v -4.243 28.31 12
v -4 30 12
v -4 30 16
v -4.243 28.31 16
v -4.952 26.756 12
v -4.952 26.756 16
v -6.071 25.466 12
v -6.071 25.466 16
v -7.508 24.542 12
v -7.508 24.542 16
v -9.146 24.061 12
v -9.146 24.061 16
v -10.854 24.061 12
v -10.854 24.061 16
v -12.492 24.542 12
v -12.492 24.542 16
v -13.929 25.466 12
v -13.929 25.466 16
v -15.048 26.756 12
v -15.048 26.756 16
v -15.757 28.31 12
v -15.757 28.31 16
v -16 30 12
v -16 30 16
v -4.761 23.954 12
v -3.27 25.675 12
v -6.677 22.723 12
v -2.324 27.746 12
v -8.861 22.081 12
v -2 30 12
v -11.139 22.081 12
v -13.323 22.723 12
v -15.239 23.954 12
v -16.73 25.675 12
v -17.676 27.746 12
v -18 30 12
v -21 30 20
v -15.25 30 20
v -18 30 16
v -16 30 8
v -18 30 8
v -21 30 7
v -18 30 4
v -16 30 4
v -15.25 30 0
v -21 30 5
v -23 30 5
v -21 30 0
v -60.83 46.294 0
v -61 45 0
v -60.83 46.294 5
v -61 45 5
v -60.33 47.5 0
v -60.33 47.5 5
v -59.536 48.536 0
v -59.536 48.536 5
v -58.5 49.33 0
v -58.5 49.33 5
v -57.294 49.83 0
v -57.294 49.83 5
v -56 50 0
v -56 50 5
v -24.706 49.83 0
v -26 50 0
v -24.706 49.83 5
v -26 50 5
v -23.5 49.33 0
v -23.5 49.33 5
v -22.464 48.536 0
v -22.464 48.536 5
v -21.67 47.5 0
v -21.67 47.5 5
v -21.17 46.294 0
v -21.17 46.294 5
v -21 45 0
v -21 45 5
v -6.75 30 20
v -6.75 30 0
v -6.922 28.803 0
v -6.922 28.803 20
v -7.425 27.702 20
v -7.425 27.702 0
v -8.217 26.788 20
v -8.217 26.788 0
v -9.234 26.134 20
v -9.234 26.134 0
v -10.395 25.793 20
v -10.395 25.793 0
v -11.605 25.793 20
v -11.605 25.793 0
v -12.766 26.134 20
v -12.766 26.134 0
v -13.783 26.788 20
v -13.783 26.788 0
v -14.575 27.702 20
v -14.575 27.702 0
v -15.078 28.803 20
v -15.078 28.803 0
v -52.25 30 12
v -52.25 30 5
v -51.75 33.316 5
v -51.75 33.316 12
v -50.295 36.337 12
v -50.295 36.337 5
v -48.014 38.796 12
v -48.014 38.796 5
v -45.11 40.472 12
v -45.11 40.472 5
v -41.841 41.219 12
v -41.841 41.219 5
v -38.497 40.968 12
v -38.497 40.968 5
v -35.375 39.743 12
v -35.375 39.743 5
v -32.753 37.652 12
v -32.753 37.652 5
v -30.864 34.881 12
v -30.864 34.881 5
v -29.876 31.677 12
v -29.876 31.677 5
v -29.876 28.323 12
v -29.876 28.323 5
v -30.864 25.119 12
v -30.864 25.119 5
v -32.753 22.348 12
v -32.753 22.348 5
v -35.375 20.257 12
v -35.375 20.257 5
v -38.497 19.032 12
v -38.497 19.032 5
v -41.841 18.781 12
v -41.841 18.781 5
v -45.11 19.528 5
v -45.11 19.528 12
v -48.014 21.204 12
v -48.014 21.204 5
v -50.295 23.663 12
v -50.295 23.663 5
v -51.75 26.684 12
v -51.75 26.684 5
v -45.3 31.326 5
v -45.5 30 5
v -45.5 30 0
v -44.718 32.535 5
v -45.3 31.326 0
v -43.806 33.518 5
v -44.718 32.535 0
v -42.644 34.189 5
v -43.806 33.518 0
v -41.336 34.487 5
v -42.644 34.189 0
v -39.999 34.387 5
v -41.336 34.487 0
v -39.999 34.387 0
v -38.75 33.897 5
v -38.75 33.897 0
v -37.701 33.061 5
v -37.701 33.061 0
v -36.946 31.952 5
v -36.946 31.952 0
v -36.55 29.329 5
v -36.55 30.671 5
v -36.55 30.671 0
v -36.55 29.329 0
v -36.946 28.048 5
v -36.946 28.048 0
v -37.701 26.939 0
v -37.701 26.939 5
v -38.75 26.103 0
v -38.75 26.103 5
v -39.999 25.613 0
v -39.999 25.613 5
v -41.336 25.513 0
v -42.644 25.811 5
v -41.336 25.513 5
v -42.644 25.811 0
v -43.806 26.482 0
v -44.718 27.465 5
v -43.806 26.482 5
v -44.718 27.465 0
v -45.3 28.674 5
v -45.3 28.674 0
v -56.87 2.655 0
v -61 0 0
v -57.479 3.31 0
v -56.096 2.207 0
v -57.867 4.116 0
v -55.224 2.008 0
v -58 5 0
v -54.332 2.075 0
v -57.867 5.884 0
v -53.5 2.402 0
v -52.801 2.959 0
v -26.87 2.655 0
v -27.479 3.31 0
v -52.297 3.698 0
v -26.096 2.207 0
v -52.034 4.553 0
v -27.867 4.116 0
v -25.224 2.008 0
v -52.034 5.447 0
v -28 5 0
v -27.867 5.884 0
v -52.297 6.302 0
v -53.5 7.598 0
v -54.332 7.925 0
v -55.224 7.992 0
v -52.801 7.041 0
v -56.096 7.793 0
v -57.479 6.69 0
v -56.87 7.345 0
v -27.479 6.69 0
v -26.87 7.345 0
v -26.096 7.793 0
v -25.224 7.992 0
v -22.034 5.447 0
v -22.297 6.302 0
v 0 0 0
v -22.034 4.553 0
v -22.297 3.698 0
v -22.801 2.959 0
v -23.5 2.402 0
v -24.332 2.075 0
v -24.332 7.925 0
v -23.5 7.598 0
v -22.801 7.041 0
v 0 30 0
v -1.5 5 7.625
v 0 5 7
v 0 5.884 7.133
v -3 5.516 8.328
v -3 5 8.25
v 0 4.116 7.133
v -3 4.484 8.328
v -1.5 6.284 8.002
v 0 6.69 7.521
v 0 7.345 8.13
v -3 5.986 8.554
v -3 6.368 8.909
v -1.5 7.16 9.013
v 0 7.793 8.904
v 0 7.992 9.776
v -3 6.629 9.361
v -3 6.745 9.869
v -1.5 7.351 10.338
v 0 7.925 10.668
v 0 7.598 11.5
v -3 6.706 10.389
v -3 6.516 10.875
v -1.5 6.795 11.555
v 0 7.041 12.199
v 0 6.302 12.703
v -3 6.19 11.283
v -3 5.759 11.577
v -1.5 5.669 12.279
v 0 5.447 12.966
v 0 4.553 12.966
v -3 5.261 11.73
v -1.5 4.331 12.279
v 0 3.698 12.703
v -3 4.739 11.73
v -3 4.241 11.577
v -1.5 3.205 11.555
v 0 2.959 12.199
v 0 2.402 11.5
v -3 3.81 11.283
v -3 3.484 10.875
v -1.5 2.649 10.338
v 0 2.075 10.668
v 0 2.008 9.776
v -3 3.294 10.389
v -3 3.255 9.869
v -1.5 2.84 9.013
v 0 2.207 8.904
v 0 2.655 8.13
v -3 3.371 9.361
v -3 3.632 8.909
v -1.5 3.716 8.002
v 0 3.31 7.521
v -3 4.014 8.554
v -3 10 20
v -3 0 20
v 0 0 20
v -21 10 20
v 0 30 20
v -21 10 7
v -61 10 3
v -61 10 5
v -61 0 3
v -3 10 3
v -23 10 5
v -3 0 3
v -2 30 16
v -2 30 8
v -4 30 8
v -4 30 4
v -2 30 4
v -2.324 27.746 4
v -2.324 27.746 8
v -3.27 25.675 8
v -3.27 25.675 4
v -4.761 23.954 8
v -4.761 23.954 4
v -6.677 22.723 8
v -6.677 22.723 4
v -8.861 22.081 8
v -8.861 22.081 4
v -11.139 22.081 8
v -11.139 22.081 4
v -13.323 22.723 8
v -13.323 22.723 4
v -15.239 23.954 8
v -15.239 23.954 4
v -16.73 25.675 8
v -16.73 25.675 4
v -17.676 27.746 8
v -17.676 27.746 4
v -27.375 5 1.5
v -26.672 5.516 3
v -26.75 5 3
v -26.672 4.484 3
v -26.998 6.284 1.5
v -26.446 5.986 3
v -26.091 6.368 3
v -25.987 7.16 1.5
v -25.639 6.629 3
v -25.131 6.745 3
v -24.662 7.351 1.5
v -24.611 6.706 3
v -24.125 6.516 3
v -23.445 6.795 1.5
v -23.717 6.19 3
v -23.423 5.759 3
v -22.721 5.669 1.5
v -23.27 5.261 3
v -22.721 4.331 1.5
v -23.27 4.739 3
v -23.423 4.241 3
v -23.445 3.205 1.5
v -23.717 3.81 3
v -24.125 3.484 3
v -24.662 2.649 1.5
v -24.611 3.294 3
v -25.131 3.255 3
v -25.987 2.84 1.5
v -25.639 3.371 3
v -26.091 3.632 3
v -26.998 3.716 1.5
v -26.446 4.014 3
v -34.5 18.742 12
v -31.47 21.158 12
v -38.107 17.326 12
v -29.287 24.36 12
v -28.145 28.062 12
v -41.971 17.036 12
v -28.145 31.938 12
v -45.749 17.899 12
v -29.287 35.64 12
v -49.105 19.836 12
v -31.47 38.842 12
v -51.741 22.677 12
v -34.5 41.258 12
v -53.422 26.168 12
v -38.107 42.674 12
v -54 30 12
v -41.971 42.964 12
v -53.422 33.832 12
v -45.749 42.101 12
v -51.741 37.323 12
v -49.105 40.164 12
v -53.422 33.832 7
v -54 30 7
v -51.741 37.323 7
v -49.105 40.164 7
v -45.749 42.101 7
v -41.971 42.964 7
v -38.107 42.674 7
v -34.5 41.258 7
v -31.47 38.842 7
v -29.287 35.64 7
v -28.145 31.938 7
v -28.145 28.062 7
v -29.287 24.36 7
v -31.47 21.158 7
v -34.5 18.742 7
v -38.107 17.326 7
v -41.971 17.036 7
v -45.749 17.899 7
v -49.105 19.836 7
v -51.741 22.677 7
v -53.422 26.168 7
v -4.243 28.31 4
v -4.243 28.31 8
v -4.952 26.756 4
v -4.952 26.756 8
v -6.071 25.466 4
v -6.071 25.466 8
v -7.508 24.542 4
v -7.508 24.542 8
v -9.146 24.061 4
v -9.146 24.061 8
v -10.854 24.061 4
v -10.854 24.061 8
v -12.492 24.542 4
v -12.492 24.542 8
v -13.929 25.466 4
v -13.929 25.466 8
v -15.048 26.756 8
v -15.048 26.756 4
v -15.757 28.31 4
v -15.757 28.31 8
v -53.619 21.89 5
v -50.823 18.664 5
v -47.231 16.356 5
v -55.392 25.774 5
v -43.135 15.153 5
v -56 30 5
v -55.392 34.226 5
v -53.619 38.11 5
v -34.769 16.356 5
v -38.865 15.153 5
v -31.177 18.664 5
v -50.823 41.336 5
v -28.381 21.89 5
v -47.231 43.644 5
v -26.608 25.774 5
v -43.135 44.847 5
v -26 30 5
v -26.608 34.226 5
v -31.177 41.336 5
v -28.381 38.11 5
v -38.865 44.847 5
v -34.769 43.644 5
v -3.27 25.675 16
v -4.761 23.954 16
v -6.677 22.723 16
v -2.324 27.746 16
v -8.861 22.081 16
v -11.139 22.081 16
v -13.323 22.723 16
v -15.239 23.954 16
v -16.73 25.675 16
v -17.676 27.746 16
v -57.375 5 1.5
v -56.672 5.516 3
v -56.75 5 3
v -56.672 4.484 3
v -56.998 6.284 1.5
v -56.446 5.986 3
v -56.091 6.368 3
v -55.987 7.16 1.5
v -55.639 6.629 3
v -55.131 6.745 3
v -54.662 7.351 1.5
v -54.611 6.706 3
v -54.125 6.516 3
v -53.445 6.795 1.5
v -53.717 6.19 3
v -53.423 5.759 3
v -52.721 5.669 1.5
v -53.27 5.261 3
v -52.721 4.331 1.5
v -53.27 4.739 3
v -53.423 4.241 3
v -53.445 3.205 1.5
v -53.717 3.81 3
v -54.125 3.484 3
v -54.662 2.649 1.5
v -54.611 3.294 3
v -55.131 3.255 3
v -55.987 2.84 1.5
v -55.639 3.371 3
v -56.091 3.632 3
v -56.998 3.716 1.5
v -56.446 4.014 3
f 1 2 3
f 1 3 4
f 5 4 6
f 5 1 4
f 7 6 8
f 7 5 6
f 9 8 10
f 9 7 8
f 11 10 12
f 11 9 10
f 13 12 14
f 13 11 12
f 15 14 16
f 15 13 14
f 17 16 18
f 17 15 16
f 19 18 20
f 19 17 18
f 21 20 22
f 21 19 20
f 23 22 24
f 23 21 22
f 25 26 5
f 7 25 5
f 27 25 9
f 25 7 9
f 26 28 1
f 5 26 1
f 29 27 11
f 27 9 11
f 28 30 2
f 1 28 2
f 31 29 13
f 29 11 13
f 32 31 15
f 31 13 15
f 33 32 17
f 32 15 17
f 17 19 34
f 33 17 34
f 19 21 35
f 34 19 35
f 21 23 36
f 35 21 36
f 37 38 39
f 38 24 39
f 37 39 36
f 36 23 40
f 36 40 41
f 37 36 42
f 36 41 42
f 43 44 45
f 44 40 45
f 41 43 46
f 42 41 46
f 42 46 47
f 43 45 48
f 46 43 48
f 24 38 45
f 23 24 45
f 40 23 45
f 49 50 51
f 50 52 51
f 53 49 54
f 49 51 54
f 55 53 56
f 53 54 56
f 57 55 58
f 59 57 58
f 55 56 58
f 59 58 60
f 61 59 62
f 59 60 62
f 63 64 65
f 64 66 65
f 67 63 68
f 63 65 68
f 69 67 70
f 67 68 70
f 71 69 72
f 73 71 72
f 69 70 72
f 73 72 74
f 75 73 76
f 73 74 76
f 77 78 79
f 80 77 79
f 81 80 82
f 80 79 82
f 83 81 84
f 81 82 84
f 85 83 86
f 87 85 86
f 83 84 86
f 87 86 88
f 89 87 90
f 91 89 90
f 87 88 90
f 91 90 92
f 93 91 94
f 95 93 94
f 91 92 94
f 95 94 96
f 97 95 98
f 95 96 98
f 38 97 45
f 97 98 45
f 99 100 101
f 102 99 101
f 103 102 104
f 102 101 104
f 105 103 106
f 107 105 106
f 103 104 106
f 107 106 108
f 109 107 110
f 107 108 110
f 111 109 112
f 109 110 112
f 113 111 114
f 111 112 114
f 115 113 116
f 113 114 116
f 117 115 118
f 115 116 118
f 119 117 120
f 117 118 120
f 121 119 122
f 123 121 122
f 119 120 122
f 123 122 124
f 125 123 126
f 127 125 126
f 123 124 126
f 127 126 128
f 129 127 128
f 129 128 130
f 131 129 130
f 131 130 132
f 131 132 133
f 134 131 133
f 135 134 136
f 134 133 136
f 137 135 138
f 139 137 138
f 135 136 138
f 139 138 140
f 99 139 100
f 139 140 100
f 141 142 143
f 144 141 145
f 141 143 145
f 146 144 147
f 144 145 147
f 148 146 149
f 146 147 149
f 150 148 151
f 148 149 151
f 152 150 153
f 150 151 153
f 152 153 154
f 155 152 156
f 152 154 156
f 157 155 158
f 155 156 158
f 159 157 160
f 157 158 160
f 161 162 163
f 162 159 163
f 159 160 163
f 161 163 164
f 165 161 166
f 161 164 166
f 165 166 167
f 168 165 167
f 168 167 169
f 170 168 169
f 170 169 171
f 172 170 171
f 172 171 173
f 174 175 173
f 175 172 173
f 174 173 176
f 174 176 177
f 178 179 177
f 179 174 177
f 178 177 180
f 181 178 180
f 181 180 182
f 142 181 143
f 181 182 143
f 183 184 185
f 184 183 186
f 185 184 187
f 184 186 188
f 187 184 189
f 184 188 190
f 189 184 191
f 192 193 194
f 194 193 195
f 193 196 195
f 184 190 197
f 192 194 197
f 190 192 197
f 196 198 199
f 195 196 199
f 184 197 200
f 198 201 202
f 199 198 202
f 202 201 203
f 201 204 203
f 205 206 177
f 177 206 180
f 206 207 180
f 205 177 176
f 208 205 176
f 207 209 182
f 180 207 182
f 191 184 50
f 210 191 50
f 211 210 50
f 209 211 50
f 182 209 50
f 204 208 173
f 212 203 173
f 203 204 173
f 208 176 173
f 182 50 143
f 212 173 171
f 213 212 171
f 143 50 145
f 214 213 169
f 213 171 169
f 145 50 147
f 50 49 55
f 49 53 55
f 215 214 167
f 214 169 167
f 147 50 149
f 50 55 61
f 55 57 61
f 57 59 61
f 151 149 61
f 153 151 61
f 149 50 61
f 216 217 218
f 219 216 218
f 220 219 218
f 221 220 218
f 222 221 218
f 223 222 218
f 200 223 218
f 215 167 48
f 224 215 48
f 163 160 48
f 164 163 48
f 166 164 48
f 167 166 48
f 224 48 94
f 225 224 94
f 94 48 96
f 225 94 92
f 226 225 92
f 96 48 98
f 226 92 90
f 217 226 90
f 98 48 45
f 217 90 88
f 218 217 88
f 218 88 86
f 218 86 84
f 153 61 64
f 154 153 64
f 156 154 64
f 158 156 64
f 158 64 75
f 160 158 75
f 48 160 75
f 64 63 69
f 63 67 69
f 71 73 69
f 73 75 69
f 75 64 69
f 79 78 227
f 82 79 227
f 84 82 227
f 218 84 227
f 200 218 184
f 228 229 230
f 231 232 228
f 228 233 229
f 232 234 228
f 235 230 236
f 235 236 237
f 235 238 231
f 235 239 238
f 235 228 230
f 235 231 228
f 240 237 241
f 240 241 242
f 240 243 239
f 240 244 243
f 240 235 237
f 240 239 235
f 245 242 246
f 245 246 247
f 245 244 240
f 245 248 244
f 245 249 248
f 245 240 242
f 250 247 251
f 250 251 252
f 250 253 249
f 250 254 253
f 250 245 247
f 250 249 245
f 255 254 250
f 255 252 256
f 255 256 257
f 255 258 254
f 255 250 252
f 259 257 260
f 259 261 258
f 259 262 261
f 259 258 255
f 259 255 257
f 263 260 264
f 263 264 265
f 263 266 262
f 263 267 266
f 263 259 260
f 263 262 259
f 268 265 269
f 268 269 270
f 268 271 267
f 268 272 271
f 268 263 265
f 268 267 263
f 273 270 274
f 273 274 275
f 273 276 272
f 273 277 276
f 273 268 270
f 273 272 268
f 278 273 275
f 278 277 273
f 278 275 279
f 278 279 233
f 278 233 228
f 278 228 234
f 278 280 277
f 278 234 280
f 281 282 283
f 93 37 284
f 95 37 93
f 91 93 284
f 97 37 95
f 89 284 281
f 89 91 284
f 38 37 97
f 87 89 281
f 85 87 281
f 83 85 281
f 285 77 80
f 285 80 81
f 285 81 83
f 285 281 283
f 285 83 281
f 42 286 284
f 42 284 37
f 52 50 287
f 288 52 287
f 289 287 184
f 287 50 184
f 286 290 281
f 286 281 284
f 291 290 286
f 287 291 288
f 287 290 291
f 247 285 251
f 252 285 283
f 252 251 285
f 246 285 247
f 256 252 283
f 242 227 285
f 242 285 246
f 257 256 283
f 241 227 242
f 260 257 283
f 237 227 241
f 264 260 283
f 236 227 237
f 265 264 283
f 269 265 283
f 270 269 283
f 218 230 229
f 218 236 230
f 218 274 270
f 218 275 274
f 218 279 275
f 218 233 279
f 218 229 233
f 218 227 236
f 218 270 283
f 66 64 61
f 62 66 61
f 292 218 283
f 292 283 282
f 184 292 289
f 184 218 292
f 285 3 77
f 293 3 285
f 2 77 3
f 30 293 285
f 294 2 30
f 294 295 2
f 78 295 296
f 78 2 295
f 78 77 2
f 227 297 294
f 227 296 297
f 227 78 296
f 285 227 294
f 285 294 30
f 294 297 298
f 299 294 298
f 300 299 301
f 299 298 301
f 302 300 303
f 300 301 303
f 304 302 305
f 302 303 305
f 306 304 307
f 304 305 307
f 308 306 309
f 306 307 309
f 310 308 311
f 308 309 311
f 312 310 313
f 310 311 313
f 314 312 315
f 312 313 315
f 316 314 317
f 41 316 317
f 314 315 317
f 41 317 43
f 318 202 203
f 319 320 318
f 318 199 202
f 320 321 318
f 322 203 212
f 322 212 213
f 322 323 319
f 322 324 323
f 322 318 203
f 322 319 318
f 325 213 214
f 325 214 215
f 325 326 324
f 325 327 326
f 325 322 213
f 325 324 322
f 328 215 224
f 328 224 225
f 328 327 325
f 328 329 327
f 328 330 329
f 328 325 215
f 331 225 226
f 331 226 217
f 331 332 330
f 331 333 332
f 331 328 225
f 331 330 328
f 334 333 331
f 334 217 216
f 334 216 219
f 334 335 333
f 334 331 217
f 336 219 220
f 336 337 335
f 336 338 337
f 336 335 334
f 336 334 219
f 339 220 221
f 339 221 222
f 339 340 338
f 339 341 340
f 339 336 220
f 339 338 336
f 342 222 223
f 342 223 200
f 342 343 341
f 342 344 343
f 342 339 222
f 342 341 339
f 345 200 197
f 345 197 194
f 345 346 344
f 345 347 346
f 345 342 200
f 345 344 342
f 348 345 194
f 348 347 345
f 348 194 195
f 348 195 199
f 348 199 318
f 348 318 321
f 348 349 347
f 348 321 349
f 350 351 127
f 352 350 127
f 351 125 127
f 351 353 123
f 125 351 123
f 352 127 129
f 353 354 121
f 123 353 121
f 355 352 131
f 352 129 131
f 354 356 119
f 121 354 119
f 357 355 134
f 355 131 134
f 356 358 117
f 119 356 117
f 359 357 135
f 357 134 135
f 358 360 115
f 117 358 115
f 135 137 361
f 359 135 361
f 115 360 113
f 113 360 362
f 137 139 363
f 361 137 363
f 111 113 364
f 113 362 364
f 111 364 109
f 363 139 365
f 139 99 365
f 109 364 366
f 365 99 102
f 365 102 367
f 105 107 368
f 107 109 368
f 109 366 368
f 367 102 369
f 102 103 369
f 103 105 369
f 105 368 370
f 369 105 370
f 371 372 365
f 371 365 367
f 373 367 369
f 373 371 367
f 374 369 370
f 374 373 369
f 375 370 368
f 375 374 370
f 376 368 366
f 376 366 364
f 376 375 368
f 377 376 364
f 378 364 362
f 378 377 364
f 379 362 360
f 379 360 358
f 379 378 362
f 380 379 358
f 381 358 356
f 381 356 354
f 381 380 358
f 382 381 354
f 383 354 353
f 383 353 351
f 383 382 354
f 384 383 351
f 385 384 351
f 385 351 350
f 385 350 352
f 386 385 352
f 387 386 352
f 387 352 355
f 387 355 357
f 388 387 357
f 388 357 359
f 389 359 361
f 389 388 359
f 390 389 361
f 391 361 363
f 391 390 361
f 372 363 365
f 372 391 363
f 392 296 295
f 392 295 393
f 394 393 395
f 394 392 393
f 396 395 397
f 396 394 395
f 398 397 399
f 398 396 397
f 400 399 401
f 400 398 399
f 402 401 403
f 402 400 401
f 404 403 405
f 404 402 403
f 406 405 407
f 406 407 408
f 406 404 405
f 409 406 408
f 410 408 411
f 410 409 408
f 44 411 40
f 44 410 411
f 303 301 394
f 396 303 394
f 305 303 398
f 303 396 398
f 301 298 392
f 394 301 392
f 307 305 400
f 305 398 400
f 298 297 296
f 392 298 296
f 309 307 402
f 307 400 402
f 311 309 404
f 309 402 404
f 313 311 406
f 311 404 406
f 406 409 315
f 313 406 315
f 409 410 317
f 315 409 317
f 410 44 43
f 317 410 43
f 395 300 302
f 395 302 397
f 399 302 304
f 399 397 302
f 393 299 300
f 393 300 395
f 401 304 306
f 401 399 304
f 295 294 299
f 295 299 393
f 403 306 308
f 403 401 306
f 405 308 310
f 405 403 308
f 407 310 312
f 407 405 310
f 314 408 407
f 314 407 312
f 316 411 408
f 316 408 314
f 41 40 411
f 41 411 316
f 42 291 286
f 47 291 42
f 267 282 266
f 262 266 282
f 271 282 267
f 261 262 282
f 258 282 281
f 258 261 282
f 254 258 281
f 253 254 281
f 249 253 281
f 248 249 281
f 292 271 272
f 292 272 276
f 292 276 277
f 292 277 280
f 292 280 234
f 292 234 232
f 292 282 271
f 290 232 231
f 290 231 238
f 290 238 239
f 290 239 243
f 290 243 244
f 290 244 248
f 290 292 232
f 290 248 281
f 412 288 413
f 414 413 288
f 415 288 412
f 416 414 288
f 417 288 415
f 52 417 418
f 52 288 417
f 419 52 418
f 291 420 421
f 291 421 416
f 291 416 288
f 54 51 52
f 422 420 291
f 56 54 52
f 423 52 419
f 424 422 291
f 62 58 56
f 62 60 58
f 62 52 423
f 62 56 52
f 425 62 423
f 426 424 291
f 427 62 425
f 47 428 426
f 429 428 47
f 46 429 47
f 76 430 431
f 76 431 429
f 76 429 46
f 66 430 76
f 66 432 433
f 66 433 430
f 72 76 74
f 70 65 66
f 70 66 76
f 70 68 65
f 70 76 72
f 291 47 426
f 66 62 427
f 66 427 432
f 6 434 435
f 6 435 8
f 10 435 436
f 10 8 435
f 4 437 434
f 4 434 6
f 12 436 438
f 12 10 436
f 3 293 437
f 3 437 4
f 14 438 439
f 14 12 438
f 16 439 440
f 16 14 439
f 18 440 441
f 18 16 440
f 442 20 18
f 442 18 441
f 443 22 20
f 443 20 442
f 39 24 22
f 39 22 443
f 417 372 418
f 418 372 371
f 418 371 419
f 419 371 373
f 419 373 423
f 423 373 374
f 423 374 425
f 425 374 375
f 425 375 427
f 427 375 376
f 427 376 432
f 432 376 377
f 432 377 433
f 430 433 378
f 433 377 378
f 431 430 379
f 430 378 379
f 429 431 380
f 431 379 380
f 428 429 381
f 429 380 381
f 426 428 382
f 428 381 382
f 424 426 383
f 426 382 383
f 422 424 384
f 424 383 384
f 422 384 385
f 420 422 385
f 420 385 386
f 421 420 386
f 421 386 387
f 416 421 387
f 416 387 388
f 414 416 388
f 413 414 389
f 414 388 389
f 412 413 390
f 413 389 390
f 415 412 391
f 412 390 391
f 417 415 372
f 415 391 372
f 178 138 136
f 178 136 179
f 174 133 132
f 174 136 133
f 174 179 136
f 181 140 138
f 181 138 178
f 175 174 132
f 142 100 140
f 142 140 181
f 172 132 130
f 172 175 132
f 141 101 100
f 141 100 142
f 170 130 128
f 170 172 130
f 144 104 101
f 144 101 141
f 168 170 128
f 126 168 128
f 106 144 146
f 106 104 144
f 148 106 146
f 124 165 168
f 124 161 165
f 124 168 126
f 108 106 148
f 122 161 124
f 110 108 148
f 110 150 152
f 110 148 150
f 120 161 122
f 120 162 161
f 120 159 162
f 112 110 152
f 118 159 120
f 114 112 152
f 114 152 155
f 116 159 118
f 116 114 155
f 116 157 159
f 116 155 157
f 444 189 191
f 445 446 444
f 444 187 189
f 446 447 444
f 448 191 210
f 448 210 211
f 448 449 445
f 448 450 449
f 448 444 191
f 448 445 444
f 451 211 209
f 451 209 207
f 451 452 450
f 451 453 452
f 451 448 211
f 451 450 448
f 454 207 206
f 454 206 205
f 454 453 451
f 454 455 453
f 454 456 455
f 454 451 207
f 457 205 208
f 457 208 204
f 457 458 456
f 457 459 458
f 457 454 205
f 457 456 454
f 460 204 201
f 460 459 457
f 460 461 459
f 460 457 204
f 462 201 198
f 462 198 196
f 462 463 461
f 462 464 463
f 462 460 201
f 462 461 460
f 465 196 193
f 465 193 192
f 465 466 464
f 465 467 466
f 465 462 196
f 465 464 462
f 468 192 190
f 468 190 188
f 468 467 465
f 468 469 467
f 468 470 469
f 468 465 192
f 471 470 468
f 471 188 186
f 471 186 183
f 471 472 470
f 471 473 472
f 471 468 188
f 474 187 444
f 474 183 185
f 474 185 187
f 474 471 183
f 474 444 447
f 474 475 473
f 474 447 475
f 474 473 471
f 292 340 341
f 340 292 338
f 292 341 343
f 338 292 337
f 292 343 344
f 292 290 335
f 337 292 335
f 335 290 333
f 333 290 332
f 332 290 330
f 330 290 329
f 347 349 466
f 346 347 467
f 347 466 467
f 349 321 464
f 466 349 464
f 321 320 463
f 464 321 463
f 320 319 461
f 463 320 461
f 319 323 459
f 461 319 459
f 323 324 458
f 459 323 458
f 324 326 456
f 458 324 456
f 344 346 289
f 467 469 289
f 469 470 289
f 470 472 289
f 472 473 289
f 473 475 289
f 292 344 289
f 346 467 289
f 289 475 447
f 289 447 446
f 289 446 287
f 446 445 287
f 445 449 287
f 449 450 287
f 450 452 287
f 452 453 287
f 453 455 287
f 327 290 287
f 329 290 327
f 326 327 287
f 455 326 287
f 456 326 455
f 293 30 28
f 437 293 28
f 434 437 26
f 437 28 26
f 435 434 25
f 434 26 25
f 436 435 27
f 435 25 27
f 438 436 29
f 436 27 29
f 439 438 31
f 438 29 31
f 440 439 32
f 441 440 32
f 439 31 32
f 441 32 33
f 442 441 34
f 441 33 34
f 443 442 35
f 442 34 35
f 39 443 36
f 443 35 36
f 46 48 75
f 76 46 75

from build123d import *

# Parameters (mm, degrees)
CYLINDER029_R       = 11.25
CYLINDER029_DEPTH   = 7
CYLINDER030_R       = 13
CYLINDER030_DEPTH   = 7
BOX009_W            = 58
BOX009_H            = 10
BOX009_DEPTH        = 3
CONE005_PITCH_ANGLE = 90
CYLINDER028_R       = 6
CYLINDER028_DEPTH   = 4
CYLINDER027_R       = 8
CYLINDER027_DEPTH   = 4
PAD003_DEPTH        = 15
SKETCH004_R         = 4.5
PAD004_DEPTH        = 20
CHAMFER004_SIZE     = 2
CHAMFER005_SIZE     = 2
FILLET003_R         = 5


with BuildPart() as espai_608_int:
    # Cylinder029 → Cylinder029 (new body)
    with BuildSketch(Plane.XY):
        Circle(CYLINDER029_R)
    extrude(amount=CYLINDER029_DEPTH)


with BuildPart() as cut037:
    # Cylinder030 → Cylinder030 (new body)
    with BuildSketch(Plane.XY):
        Circle(CYLINDER030_R)
    extrude(amount=CYLINDER030_DEPTH)

    # Cut037: cut espai-608-int
    add(espai_608_int.part, mode=Mode.SUBTRACT)


with BuildPart() as cut037_1:
    # Cut037 placement: moved
    add(cut037.part.moved(Location((41, 30, 5))))


with BuildPart() as espai_fusta001:
    # Box009 → Box009 (new body)
    with BuildSketch(Plane(origin=(3, 0, 3), x_dir=(1, 0, 0), z_dir=(0, 0, 1))):
        with Locations((29, 5)):
            Rectangle(BOX009_W, BOX009_H)
    extrude(amount=BOX009_DEPTH)


with BuildPart() as cone_forat_cargol005:
    # Cone004 → Cone004 (revolve)
    with BuildSketch(Plane(origin=(55, 5, 0), x_dir=(1, 0, 0), z_dir=(0, -1, 0))):
        Polygon((0, 0), (3, 0), (1.75, 3), (0, 3), align=None)
    revolve(axis=Axis((55, 5, 0), (0, 0, 1)))


with BuildPart() as cone_forat_cargol004:
    # Cone003 → Cone003 (revolve)
    with BuildSketch(Plane(origin=(25, 5, 0), x_dir=(1, 0, 0), z_dir=(0, -1, 0))):
        Polygon((0, 0), (3, 0), (1.75, 3), (0, 3), align=None)
    revolve(axis=Axis((25, 5, 0), (0, 0, 1)))


with BuildPart() as cone_forat_cargol006:
    # Cone005 → Cone005 (revolve)
    with BuildSketch(Plane.XZ):
        Polygon((0, 0), (3, 0), (1.75, 3), (0, 3), align=None)
    revolve(axis=Axis((0, 0, 0), (0, 0, 1)))


with BuildPart() as cone_forat_cargol006_1:
    # Cone005 pitch: moved
    add(cone_forat_cargol006.part.rotate(Axis((0, 0, 0), (0, 1, 0)), CONE005_PITCH_ANGLE))


with BuildPart() as cone_forat_cargol006_2:
    # Cone005 placement: moved
    add(cone_forat_cargol006_1.part.moved(Location((0, 5, 10))))


with BuildPart() as cyl_brida_int005:
    # Cylinder028 → Cylinder028 (new body)
    with BuildSketch(Plane.XY):
        Circle(CYLINDER028_R)
    extrude(amount=CYLINDER028_DEPTH)


with BuildPart() as cyl_brida_ext005:
    # Cylinder027 → Cylinder027 (new body)
    with BuildSketch(Plane.XY):
        Circle(CYLINDER027_R)
    extrude(amount=CYLINDER027_DEPTH)


with BuildPart() as espai_brida008:
    # Cut036 base: copy of Cyl-brida-ext005
    add(cyl_brida_ext005.part)

    # Cut036: cut Cyl-brida-int005
    add(cyl_brida_int005.part, mode=Mode.SUBTRACT)


with BuildPart() as espai_brida008_1:
    # Cut036 placement: moved
    add(espai_brida008.part.moved(Location((10, 30, 12))))


with BuildPart() as espai_brida007:
    # Cut035 base: copy of Cyl-brida-ext005
    add(cyl_brida_ext005.part)

    # Cut035: cut Cyl-brida-int005
    add(cyl_brida_int005.part, mode=Mode.SUBTRACT)


with BuildPart() as espai_brida007_1:
    # Cut035 placement: moved
    add(espai_brida007.part.moved(Location((10, 30, 4))))


with BuildPart() as pad_perfil_retalla001:
    # Sketch003 → Pad003 (new body)
    with BuildSketch(Plane.XY.offset(5)):
        Polygon((3, 10), (21, 10), (21, 50), (61, 50), (61, 0), (3, 0), align=None)
    extrude(amount=PAD003_DEPTH)


with BuildPart() as y_end_idler:
    # Sketch004 → Pad004 (new body)
    with BuildSketch(Plane.XY):
        with BuildLine():
            ThreePointArc((6.75, 30), (11, 25.75), (15.25, 30))
            Line((15.25, 30), (21, 30))
            Line((21, 30), (21, 50))
            Line((21, 50), (61, 50))
            Line((61, 50), (61, 0))
            Line((0, 0), (61, 0))
            Line((0, 30), (0, 0))
            Line((6.75, 30), (0, 30))
        make_face()
        with Locations((41, 30)):
            Circle(SKETCH004_R, mode=Mode.SUBTRACT)
    extrude(amount=PAD004_DEPTH)

    # Cut034: cut Pad-perfil-retalla001
    add(pad_perfil_retalla001.part, mode=Mode.SUBTRACT)

    # Cut033: cut espai-brida007
    add(espai_brida007_1.part, mode=Mode.SUBTRACT)

    # Cut032: cut espai-brida008
    add(espai_brida008_1.part, mode=Mode.SUBTRACT)

    # Cut030: cut Cone-forat-cargol006
    add(cone_forat_cargol006_2.part, mode=Mode.SUBTRACT)

    # Cut029: cut Cone-forat-cargol004
    add(cone_forat_cargol004.part, mode=Mode.SUBTRACT)

    # Cut028: cut Cone-forat-cargol005
    add(cone_forat_cargol005.part, mode=Mode.SUBTRACT)

    # Cut031: cut espai-fusta001
    add(espai_fusta001.part, mode=Mode.SUBTRACT)

    # Fusion002: union Cut037
    add(cut037_1.part)

    # Chamfer004
    chamfer004_edges = [y_end_idler.edges().sort_by_distance(p)[0] for p in [
        (21, 20, 5),
    ]]
    chamfer(chamfer004_edges, length=CHAMFER004_SIZE)

    # Chamfer005
    chamfer005_edges = [y_end_idler.edges().sort_by_distance(p)[0] for p in [
        (28, 30, 5),
    ]]
    chamfer(chamfer005_edges, length=CHAMFER005_SIZE)

    # Fillet003
    fillet003_edges = [y_end_idler.edges().sort_by_distance(p)[0] for p in [
        (61, 50, 2.5),
        (21, 50, 2.5),
    ]]
    fillet(fillet003_edges, radius=FILLET003_R)


with BuildPart() as part_mirroring001:
    # Part__Mirroring001: instance of y-end-idler
    add(y_end_idler.part.mirror(Plane(origin=(0, 0, 0), x_dir=(0, -1, 0), z_dir=(1, 0, 0))))


solid = part_mirroring001.part
